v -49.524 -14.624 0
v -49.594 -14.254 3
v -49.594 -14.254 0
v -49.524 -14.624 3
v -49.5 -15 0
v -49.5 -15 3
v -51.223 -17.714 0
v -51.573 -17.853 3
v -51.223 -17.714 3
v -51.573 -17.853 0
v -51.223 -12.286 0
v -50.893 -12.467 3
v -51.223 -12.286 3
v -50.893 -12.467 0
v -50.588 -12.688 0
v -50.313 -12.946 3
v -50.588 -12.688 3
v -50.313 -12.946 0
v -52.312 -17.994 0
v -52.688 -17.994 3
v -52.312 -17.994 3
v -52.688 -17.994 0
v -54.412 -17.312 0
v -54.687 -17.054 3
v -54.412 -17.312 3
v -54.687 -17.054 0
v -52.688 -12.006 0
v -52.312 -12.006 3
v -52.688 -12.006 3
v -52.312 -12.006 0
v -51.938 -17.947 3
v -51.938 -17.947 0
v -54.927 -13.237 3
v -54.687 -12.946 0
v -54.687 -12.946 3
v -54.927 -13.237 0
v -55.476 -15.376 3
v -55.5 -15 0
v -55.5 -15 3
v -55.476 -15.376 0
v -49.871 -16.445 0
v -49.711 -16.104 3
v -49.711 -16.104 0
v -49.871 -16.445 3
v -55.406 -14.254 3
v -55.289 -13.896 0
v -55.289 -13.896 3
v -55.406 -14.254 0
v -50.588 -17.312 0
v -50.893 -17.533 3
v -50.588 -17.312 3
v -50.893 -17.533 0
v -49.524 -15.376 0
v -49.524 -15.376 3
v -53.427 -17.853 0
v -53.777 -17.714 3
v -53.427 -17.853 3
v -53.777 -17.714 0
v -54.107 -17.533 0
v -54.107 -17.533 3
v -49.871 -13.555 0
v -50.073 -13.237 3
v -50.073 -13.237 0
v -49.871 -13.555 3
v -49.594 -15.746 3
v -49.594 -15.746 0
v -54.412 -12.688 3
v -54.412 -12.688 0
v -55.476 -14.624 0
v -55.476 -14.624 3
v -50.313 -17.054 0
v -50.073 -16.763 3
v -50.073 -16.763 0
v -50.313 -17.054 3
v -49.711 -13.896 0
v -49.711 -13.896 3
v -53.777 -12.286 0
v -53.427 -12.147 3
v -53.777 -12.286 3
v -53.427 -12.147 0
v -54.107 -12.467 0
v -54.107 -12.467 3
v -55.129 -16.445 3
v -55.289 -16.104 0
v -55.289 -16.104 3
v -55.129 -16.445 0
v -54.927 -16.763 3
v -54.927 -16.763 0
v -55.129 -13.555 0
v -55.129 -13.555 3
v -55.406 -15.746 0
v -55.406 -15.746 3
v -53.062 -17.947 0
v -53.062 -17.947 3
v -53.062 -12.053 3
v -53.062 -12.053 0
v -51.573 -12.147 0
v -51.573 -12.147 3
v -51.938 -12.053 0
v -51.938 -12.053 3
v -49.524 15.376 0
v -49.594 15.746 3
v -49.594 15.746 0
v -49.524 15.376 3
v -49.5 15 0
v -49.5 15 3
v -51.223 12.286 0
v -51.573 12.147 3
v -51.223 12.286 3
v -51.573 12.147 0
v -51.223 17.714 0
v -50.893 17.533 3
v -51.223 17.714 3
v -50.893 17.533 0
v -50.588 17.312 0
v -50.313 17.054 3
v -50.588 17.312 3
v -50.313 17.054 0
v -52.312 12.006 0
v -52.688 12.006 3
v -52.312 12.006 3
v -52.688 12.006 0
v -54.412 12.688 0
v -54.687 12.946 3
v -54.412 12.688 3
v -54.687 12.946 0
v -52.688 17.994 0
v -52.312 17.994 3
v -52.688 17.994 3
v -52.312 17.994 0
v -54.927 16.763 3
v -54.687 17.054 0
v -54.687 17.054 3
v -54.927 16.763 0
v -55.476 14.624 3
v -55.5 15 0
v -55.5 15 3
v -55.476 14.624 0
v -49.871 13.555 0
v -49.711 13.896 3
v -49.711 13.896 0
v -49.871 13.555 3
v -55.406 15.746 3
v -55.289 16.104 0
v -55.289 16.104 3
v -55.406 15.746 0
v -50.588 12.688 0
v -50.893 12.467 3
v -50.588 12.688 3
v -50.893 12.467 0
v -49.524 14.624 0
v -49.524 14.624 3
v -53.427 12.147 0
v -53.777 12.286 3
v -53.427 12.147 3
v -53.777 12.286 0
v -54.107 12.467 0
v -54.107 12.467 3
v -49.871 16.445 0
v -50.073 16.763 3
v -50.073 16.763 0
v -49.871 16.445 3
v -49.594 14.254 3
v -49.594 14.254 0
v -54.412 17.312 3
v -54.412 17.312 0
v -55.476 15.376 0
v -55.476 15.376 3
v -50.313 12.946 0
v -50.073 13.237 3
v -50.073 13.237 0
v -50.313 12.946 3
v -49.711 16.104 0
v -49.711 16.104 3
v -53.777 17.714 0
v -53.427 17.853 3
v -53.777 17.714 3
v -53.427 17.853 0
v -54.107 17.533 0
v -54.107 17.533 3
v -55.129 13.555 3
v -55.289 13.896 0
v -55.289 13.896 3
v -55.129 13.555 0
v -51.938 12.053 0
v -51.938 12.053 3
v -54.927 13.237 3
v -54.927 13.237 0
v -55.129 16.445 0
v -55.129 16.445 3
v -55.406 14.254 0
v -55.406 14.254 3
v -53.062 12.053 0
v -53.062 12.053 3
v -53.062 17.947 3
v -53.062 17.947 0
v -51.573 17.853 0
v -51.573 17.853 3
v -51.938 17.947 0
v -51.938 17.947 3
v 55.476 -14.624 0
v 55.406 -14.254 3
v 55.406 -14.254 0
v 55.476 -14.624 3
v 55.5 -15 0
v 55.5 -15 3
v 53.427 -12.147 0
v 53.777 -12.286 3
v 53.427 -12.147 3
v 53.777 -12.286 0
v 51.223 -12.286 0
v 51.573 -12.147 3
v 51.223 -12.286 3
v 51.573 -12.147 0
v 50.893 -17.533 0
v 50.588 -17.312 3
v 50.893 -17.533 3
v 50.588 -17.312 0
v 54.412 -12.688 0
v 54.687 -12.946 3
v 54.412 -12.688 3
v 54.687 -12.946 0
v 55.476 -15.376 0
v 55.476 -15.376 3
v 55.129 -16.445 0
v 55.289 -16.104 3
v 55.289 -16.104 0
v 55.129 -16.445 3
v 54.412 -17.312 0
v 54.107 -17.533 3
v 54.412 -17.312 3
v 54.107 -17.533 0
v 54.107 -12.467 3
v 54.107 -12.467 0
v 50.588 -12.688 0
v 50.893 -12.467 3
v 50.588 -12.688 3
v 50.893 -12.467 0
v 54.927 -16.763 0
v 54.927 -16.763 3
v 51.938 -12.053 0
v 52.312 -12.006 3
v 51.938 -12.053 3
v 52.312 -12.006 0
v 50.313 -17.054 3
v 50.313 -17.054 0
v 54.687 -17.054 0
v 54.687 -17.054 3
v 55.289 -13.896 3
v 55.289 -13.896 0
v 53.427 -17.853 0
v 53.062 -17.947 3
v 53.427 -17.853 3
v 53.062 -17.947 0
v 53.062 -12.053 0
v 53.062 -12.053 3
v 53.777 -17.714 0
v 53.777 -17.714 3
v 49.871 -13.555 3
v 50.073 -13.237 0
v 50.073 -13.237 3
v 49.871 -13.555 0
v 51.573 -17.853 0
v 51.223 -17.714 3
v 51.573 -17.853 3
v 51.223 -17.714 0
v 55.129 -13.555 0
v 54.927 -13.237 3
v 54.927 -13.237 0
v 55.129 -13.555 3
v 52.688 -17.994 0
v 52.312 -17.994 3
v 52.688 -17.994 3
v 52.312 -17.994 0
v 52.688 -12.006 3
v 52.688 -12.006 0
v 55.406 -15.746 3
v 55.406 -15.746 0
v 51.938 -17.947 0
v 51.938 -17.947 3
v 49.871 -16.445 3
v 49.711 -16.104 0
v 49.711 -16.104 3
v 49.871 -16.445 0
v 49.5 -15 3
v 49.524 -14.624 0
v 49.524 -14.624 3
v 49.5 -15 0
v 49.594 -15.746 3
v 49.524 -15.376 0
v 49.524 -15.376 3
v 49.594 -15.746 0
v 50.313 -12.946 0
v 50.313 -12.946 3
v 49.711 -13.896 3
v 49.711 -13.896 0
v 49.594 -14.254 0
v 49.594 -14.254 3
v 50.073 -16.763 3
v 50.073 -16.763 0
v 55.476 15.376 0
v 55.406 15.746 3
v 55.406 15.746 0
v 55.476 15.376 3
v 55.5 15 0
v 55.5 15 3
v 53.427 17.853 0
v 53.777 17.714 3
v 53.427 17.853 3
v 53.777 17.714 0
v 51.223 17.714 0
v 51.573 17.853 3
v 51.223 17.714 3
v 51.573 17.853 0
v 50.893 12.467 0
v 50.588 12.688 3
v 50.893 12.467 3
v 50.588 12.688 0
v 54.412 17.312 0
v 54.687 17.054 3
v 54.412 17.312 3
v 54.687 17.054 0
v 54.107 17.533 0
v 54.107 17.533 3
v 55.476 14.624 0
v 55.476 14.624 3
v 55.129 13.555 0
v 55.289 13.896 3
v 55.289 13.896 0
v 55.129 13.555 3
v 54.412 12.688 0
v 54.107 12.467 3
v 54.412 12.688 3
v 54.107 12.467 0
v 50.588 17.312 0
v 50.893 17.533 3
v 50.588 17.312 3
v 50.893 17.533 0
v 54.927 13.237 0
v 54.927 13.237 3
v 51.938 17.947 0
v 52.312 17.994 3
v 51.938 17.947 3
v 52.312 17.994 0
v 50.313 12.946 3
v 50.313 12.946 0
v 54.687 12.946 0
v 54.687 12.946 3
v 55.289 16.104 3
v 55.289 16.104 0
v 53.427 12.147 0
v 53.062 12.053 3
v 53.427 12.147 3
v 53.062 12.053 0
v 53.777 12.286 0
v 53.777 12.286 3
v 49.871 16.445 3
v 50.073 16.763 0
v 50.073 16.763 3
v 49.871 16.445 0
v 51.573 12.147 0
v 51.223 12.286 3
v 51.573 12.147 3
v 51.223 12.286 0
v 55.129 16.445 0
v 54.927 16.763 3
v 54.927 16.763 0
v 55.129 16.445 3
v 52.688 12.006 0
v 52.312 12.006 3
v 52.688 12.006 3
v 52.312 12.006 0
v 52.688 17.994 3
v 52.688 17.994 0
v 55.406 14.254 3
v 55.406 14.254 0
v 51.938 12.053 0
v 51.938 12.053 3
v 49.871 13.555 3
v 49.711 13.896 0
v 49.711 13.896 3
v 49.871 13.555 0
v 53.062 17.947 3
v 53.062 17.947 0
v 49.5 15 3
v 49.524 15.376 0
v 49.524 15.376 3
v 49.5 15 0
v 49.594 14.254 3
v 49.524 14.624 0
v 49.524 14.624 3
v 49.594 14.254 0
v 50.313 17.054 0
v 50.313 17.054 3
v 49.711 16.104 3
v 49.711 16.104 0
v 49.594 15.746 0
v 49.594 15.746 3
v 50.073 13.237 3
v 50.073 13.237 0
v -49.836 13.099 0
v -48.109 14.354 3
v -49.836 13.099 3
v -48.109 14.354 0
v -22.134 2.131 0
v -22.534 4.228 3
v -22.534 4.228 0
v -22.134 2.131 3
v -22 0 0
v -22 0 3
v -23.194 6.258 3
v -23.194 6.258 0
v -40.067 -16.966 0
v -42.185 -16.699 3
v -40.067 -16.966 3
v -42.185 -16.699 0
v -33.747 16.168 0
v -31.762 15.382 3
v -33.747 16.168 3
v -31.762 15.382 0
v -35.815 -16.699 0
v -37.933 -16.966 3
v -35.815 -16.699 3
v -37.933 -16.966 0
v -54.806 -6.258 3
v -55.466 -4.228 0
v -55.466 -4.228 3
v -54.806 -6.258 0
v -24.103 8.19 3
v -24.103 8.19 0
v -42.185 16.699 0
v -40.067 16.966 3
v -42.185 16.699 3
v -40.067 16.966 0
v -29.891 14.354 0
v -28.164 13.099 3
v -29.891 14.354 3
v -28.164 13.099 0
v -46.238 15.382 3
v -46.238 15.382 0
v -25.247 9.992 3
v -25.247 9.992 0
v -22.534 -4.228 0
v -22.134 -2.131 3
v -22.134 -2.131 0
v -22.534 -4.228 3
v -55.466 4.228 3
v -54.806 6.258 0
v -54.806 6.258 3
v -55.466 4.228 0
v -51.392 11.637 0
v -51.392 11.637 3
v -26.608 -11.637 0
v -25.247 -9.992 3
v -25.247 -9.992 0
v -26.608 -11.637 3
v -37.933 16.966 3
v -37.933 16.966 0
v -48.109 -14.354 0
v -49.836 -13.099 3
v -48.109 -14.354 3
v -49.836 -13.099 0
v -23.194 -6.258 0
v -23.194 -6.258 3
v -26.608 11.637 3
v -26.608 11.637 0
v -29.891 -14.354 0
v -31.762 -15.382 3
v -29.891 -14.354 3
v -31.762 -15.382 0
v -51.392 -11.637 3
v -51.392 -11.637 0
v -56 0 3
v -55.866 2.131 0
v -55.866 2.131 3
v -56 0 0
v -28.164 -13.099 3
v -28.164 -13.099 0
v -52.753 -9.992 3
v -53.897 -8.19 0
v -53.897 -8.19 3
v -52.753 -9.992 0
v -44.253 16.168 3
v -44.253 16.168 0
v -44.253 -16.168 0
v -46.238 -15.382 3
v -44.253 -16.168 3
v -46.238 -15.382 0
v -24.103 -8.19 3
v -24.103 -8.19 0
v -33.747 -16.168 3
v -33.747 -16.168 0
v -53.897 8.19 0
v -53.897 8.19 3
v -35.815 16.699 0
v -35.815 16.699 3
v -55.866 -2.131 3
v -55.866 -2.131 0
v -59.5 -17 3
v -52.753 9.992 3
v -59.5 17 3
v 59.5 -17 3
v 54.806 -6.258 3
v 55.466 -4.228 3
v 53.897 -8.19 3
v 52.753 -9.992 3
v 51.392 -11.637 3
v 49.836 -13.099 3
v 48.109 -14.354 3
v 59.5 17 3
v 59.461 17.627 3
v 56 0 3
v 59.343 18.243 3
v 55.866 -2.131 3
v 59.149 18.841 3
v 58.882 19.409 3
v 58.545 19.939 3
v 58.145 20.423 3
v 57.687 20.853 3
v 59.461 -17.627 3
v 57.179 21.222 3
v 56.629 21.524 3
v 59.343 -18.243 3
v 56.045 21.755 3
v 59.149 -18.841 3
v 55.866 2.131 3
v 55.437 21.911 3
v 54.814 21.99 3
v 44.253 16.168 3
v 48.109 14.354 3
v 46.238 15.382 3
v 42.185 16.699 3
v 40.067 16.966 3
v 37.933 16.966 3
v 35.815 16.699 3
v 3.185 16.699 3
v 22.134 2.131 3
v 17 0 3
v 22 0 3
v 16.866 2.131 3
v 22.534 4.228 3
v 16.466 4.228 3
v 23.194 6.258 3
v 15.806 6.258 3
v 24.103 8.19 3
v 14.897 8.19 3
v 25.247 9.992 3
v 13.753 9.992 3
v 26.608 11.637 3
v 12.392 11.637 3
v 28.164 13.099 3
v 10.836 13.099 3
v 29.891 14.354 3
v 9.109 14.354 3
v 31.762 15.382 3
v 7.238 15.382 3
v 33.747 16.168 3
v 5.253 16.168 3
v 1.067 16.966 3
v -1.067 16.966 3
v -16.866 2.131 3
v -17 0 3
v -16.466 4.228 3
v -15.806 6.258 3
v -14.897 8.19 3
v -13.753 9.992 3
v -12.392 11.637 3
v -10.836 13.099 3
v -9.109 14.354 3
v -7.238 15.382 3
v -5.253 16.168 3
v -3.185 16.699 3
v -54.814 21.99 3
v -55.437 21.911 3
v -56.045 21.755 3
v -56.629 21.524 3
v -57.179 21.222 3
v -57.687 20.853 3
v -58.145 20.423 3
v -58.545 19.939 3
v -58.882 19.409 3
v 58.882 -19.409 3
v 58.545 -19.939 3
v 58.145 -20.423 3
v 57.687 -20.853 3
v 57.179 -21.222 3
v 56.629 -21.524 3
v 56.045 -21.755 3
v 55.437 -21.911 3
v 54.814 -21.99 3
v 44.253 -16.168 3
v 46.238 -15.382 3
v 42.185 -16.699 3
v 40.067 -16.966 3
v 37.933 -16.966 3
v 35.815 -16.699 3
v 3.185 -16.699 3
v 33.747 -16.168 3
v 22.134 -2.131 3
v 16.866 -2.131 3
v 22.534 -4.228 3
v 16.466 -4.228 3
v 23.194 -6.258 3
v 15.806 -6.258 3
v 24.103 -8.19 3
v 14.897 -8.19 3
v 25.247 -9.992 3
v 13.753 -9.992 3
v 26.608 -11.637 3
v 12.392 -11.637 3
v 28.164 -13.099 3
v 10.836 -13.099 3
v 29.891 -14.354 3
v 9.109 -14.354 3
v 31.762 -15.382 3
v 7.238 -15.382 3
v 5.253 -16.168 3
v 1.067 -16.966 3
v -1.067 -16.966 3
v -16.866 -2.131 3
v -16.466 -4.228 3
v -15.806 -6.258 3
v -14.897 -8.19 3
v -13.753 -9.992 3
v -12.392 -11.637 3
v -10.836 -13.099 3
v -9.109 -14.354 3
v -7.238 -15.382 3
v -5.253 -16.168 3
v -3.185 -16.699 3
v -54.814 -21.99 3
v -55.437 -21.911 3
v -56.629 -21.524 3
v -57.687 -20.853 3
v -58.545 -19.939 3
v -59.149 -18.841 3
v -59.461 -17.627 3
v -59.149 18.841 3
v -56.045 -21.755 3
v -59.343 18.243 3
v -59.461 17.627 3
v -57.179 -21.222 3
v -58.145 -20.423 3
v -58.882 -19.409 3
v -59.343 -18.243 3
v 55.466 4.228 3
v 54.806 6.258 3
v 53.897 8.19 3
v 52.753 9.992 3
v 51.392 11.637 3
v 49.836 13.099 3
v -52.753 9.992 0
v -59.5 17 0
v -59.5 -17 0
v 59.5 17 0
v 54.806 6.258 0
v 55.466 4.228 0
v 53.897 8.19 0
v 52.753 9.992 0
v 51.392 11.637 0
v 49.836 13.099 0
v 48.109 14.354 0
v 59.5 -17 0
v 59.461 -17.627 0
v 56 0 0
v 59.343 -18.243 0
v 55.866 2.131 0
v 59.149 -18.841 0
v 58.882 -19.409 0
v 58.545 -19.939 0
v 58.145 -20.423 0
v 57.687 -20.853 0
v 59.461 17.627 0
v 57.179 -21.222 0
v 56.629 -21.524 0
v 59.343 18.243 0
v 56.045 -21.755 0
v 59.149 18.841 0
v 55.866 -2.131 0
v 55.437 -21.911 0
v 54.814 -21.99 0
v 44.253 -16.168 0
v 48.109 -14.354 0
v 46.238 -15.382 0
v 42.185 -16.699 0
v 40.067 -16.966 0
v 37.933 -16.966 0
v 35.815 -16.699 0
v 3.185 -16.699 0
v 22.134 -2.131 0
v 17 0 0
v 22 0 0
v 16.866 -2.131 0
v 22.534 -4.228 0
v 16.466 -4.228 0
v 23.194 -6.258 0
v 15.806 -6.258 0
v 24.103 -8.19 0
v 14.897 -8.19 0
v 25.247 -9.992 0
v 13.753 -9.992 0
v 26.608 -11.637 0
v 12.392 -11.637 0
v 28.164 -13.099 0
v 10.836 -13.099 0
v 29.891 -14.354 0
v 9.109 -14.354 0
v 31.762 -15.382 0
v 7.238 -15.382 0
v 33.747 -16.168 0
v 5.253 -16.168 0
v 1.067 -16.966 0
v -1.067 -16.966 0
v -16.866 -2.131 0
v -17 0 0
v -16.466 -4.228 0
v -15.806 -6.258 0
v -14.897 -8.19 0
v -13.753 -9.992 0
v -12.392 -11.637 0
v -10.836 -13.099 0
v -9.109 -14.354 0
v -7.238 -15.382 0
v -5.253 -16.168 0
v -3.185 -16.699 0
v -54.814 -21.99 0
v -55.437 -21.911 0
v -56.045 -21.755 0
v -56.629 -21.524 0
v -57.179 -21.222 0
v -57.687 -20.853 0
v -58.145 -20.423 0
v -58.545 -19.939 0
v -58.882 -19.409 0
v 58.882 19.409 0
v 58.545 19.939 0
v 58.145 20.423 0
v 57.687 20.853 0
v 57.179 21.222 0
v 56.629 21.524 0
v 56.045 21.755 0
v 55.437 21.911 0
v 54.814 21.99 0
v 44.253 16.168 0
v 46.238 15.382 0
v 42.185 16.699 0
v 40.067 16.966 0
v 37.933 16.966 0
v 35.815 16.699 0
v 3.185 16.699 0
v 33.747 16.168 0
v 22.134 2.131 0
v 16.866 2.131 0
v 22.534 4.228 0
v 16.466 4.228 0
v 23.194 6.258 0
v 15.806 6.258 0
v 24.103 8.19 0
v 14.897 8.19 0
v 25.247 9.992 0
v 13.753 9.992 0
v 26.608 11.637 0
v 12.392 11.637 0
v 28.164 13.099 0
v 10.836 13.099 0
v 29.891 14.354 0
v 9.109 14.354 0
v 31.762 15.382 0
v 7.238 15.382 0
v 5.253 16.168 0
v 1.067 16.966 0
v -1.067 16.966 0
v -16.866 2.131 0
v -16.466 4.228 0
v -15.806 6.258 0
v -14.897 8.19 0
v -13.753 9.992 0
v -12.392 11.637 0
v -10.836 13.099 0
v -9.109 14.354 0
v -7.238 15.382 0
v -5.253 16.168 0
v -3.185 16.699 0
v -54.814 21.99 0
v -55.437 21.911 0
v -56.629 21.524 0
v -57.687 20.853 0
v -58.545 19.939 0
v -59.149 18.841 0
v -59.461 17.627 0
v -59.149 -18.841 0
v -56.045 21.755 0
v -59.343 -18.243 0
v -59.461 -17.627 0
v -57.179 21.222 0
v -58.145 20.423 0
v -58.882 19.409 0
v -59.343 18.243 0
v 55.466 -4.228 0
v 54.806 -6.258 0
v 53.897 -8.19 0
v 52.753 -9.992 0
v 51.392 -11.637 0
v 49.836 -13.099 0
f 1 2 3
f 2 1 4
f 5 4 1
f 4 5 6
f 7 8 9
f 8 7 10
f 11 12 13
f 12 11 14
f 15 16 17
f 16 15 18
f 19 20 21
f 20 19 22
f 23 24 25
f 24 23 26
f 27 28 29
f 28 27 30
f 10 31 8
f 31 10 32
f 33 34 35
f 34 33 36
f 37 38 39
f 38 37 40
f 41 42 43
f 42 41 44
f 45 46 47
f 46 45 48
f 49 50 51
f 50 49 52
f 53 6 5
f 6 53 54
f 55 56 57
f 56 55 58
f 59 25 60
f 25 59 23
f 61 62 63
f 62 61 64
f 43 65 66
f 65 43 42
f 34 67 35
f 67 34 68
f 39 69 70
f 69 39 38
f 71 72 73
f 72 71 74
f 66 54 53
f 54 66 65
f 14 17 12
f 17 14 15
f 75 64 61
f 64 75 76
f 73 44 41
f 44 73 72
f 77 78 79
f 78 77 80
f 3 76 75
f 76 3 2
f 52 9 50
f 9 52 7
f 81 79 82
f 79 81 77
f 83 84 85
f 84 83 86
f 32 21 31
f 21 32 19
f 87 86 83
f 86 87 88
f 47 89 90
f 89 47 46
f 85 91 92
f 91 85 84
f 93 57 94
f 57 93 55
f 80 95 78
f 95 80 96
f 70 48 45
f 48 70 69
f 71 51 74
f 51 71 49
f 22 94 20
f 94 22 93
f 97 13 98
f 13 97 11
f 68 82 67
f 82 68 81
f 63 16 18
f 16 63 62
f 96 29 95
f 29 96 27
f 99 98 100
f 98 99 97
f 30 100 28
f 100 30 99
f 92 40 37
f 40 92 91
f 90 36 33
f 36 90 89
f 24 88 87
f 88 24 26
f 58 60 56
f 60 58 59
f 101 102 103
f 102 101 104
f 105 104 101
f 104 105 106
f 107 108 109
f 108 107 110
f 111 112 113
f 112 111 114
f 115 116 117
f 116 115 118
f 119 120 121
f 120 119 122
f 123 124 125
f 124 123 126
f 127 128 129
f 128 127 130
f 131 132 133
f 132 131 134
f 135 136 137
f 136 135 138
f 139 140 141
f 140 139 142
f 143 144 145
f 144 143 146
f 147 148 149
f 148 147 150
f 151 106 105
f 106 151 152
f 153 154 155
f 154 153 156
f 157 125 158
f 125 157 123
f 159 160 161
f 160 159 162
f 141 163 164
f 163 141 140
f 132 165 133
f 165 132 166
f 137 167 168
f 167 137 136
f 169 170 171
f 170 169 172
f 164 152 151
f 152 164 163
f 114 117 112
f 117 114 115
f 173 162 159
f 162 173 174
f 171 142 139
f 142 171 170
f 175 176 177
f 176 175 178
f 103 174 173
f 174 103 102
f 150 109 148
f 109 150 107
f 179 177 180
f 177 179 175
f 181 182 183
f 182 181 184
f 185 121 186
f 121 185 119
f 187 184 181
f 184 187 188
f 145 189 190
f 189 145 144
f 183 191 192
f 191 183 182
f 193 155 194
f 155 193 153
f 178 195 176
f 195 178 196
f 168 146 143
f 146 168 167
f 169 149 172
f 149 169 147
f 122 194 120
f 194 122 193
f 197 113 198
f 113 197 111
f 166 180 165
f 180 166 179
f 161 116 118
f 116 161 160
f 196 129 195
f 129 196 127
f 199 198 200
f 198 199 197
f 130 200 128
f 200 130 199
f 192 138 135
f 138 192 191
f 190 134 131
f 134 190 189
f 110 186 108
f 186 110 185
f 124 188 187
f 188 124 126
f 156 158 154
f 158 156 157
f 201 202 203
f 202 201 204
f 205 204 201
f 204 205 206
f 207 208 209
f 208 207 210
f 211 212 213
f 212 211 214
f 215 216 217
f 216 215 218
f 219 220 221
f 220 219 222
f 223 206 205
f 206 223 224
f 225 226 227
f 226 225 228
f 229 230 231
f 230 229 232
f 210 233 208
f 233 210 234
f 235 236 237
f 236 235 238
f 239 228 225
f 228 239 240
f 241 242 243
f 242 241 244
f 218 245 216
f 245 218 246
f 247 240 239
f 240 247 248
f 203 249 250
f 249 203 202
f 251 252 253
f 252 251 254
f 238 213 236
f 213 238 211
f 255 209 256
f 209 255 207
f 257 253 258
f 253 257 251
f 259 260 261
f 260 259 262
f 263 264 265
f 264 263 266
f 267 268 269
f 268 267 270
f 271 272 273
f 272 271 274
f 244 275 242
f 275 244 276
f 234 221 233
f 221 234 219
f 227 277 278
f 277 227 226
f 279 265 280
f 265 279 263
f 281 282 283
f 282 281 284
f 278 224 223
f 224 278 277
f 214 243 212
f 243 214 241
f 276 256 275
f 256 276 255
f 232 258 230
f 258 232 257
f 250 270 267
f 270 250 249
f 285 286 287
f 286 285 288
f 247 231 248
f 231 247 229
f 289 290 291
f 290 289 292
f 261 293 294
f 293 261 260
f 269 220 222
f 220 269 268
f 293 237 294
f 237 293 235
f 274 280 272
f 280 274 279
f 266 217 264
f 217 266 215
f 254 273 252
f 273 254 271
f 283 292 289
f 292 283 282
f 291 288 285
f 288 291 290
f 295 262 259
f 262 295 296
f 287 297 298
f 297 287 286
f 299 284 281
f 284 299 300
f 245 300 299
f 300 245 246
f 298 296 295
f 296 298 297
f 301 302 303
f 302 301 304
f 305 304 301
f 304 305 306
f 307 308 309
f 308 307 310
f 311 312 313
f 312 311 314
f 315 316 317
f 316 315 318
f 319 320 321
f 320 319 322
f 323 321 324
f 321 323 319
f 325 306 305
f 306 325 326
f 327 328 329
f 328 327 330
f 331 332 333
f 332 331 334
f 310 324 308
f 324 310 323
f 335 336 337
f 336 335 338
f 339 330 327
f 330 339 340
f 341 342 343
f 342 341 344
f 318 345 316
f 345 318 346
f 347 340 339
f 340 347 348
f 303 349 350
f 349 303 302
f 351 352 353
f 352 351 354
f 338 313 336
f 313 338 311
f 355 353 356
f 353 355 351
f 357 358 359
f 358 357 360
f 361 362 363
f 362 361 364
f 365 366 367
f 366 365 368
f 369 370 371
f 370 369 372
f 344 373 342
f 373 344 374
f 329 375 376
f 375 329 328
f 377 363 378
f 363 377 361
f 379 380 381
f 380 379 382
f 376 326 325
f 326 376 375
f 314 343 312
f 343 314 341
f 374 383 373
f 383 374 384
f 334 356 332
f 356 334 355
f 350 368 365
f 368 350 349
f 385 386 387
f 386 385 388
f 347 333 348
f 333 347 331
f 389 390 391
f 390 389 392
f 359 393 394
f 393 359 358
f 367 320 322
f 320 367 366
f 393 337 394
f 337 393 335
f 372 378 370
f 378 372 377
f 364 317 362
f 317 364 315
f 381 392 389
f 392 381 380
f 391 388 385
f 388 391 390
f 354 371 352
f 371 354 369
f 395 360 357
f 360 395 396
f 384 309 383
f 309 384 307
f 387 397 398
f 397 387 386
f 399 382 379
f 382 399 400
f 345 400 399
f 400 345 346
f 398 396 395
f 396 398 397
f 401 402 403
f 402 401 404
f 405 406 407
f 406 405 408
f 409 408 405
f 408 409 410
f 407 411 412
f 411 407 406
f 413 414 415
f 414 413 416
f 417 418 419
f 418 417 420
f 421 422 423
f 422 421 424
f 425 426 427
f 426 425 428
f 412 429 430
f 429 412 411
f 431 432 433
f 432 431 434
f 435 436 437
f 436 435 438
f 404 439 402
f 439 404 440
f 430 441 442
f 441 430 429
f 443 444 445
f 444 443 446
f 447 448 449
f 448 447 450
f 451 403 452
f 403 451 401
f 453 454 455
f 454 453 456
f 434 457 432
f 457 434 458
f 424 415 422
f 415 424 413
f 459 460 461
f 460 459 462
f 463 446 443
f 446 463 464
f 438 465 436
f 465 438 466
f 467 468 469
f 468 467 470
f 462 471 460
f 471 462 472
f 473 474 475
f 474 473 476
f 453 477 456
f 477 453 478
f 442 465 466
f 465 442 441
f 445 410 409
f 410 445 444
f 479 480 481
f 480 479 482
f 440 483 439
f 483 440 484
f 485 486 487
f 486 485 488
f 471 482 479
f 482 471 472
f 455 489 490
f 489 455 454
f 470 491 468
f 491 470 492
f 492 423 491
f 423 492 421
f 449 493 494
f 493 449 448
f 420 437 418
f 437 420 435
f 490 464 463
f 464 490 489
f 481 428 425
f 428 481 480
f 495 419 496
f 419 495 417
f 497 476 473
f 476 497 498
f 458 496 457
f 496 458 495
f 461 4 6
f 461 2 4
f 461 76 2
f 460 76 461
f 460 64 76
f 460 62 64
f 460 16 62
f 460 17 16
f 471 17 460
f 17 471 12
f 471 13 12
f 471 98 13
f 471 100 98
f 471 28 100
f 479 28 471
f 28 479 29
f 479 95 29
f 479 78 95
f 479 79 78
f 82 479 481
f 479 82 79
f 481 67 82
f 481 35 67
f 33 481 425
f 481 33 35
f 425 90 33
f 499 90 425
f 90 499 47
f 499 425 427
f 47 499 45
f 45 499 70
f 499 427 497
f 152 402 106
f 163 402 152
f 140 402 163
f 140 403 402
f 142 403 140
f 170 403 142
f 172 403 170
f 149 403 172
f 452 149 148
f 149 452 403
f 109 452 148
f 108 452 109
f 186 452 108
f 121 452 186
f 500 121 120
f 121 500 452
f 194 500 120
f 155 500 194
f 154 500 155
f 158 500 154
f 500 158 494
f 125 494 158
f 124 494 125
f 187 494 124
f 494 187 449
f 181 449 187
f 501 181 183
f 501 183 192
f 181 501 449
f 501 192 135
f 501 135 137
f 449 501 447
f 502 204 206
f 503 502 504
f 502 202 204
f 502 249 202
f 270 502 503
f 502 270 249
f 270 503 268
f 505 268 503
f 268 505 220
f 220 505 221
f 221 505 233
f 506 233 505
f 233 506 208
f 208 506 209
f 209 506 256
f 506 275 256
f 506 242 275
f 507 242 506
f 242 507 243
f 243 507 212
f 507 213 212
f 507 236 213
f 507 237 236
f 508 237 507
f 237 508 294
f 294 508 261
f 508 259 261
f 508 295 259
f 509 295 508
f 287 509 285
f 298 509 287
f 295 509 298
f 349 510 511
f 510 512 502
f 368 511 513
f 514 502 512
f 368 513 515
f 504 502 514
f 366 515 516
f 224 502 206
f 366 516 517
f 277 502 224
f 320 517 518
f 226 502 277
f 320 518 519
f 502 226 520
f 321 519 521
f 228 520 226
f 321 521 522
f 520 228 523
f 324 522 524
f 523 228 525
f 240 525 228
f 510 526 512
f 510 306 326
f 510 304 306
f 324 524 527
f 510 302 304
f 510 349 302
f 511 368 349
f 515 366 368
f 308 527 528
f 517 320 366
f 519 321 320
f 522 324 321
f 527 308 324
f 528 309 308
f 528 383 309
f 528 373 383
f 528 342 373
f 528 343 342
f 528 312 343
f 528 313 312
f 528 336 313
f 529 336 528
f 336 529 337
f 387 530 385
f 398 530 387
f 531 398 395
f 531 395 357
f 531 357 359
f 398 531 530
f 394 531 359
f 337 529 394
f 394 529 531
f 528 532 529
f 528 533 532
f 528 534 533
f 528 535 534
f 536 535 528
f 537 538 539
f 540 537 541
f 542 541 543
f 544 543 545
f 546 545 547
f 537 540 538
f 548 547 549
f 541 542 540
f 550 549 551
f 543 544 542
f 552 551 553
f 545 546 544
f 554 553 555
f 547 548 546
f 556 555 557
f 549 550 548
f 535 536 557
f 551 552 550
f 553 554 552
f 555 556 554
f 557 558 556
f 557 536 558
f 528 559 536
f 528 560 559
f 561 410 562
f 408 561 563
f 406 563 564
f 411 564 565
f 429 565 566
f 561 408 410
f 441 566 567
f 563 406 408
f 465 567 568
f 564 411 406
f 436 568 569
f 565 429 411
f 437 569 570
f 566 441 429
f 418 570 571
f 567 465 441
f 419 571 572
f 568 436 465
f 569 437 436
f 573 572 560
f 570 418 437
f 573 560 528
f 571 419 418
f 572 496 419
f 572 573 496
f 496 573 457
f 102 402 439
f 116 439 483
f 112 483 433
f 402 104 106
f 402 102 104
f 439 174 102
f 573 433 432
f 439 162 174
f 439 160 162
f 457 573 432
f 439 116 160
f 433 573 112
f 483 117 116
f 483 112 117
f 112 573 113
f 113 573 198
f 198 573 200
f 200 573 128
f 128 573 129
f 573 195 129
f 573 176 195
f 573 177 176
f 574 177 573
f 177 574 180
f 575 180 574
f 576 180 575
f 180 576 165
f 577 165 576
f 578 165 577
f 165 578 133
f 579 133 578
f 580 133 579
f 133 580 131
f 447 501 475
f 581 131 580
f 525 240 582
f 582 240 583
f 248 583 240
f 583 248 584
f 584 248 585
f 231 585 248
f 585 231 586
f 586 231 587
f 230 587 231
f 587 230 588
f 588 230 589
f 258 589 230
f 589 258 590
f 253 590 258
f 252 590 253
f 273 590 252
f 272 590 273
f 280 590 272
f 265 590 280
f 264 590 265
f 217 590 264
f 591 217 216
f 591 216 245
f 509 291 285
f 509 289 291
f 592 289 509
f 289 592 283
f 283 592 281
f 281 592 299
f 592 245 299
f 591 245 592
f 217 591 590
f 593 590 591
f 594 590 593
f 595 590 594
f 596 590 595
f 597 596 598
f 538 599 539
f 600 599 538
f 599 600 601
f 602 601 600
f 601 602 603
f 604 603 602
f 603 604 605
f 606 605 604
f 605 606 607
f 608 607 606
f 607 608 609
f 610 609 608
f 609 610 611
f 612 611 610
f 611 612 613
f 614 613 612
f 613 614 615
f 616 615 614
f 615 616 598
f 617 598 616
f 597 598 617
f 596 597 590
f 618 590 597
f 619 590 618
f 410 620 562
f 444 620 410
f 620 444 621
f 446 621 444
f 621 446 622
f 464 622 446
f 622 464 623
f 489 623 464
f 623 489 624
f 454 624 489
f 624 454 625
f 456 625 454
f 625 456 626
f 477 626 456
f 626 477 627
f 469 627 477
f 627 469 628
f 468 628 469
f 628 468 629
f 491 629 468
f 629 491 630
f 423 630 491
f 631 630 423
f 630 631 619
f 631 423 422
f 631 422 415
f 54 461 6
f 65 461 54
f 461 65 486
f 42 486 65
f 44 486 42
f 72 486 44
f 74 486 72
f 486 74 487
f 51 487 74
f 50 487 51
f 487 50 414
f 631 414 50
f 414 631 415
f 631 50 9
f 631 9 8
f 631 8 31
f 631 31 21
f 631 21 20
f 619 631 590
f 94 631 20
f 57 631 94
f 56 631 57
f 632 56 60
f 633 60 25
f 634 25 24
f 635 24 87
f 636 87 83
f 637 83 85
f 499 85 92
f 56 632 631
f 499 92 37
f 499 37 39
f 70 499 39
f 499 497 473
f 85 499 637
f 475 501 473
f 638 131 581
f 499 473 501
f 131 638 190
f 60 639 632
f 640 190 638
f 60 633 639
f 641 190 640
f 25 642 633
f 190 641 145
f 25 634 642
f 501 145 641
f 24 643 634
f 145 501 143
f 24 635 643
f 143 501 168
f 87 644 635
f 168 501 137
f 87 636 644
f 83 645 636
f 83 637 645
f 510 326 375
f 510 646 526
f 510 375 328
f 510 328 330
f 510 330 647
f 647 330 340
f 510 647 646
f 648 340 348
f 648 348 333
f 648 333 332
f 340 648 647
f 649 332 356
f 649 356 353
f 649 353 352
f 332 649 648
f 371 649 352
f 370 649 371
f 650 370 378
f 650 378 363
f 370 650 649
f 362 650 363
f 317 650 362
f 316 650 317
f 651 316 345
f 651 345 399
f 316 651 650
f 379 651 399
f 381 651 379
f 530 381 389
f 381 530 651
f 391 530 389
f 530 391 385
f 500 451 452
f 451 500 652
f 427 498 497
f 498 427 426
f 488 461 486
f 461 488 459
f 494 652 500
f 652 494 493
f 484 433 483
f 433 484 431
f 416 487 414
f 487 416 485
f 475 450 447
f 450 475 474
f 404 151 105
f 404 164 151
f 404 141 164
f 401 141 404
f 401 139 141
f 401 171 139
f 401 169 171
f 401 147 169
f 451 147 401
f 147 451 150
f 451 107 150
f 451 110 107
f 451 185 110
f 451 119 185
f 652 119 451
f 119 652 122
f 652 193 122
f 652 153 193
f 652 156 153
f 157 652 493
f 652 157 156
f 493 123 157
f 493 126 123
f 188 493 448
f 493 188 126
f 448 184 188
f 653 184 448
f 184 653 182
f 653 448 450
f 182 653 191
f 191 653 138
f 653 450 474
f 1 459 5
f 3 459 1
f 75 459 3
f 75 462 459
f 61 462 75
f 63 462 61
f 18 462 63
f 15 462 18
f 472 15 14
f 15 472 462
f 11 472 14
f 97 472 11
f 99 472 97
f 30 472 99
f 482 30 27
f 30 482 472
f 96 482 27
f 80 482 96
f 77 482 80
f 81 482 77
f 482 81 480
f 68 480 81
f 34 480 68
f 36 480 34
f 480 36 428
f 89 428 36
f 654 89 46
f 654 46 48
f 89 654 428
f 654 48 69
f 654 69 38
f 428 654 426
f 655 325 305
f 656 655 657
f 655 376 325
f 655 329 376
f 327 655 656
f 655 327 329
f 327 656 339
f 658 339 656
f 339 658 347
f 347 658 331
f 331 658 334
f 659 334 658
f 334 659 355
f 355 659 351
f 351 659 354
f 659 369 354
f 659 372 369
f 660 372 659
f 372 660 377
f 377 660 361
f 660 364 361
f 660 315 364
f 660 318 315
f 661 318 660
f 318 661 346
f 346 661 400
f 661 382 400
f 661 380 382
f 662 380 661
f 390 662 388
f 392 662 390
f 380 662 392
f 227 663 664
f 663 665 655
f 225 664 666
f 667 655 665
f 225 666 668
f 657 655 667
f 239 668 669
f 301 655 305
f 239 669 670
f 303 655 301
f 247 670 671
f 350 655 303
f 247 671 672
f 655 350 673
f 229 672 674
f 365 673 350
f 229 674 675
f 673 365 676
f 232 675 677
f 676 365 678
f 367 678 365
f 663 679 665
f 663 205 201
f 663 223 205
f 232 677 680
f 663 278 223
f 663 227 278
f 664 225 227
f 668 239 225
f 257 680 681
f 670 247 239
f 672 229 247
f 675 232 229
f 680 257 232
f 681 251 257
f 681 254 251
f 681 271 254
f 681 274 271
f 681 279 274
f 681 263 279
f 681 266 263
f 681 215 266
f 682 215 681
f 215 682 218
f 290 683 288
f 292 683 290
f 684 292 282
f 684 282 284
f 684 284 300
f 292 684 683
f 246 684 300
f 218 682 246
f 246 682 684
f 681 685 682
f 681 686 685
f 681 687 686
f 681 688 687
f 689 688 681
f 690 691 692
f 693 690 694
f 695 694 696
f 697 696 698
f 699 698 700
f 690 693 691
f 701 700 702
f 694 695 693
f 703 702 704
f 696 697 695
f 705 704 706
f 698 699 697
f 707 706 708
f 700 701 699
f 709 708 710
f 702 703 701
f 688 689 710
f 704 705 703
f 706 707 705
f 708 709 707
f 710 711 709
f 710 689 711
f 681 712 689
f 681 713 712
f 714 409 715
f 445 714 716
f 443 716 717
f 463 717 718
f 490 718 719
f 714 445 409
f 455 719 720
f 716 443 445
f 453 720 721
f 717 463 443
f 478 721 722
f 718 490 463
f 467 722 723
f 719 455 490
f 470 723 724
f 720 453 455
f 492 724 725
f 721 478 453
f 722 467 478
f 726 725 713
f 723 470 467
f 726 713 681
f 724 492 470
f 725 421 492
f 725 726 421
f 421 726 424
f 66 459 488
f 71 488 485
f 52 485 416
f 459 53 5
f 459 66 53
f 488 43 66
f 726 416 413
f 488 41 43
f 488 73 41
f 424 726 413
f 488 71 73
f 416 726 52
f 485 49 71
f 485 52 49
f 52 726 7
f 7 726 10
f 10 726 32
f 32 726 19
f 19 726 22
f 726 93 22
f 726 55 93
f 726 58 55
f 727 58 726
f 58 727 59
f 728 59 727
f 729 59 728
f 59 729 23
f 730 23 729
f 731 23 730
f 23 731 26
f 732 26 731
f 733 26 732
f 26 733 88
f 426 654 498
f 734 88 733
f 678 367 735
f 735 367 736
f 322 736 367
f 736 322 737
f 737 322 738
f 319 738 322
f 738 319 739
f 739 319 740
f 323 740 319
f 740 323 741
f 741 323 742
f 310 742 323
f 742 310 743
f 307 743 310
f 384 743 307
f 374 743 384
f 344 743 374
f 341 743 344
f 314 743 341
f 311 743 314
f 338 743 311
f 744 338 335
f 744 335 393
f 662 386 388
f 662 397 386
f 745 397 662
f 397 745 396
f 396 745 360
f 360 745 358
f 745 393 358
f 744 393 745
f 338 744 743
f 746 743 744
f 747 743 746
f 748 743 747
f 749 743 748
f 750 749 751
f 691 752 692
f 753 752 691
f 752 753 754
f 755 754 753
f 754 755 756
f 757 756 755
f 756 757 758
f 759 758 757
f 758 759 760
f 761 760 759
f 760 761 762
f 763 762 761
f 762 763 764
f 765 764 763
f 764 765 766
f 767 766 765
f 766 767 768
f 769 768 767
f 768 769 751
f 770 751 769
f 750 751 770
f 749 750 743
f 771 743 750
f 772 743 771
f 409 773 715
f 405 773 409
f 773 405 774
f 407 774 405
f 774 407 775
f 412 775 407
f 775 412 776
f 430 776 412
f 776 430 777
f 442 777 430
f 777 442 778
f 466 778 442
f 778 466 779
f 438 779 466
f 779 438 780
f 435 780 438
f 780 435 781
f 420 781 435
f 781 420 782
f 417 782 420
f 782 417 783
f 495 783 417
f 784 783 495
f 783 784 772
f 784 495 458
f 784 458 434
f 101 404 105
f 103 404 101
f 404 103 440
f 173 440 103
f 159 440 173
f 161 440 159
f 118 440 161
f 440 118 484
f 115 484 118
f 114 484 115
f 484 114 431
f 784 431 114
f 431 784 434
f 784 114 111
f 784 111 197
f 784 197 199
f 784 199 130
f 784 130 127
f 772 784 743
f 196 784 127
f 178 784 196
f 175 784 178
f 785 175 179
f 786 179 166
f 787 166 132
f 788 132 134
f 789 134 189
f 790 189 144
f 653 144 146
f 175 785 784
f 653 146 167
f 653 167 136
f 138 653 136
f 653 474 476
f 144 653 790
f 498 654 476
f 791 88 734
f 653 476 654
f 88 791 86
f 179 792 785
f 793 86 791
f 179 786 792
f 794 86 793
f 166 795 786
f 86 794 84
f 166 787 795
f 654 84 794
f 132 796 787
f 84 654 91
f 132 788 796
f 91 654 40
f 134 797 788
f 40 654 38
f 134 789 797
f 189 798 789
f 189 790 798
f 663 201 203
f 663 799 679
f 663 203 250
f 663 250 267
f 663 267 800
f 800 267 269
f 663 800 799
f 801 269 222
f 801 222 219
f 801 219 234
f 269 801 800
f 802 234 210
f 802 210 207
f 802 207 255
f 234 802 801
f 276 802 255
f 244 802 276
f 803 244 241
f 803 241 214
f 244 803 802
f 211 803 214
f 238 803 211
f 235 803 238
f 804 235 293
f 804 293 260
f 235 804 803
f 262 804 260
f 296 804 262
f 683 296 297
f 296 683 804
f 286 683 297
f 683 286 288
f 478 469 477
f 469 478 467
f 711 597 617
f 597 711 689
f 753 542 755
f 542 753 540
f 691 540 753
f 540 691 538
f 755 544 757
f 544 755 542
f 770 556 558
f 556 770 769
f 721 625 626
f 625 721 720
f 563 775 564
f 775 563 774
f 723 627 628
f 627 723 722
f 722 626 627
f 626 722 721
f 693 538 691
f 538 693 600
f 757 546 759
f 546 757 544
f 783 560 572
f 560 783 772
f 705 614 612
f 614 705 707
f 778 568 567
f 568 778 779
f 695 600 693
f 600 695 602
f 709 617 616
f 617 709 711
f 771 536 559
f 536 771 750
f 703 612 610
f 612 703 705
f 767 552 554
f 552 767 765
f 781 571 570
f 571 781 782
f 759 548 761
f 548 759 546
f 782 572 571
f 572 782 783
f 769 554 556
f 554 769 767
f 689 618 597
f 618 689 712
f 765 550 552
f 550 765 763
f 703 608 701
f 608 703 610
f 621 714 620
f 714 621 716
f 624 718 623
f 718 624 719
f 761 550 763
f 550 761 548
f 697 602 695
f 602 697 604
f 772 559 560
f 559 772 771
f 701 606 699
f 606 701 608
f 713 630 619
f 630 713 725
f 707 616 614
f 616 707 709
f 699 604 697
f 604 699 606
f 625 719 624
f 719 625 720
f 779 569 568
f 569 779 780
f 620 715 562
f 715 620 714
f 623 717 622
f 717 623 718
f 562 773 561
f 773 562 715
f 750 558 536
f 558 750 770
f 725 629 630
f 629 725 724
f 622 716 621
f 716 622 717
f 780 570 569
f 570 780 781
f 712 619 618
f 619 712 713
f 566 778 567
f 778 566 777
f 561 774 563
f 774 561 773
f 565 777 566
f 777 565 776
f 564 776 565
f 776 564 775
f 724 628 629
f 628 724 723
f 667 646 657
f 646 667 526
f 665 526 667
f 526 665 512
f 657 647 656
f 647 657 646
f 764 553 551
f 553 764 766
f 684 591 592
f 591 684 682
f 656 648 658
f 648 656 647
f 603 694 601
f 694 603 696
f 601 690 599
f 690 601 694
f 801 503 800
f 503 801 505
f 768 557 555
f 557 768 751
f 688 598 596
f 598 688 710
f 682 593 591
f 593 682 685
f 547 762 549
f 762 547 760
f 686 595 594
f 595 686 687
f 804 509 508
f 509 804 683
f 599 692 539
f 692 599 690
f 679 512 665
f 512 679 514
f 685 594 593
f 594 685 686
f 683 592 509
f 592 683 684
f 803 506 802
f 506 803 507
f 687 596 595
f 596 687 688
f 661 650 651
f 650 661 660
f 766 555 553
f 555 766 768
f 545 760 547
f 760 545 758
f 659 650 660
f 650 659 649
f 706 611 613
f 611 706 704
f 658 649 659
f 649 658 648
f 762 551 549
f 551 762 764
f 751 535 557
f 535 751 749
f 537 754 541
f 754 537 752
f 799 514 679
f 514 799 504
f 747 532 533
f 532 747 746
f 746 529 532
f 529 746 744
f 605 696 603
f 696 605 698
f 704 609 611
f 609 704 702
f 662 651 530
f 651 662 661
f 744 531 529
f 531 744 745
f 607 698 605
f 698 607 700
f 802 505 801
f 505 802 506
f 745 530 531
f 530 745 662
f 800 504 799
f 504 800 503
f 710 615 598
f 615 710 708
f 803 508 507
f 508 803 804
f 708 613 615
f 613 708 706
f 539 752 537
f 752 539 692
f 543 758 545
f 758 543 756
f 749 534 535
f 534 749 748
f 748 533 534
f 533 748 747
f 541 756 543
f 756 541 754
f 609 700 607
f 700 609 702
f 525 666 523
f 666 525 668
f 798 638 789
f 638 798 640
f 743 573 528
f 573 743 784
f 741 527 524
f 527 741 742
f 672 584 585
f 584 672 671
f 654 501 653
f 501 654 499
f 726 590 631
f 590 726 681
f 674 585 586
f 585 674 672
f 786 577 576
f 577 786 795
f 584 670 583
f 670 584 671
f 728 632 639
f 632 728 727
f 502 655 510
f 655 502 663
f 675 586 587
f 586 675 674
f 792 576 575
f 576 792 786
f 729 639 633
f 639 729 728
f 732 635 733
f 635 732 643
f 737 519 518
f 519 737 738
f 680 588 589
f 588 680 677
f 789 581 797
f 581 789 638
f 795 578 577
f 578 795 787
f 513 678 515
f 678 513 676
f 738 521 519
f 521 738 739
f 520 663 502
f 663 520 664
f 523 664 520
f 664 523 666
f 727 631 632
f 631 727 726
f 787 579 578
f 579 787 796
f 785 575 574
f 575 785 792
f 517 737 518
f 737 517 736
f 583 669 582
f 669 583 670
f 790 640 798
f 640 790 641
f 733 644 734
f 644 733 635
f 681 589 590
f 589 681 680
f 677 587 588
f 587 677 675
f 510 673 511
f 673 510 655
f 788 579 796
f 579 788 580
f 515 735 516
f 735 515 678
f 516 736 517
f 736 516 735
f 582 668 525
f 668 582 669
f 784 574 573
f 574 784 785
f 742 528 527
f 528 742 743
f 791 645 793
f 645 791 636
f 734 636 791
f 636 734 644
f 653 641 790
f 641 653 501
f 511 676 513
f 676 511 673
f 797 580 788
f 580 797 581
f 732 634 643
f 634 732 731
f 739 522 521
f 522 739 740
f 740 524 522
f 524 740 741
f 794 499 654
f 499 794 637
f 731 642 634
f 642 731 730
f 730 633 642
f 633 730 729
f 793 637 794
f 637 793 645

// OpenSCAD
$fn = 50;


difference() {
	union() {
		hull() {
			translate(v = [-54.5000000000, 17.0000000000, 0]) {
				cylinder(h = 3, r = 5);
			}
			translate(v = [54.5000000000, 17.0000000000, 0]) {
				cylinder(h = 3, r = 5);
			}
			translate(v = [-54.5000000000, -17.0000000000, 0]) {
				cylinder(h = 3, r = 5);
			}
			translate(v = [54.5000000000, -17.0000000000, 0]) {
				cylinder(h = 3, r = 5);
			}
		}
	}
	union() {
		#translate(v = [-52.5000000000, -15.0000000000, -100.0000000000]) {
			cylinder(h = 200, r = 3.0000000000);
		}
		#translate(v = [-52.5000000000, 15.0000000000, -100.0000000000]) {
			cylinder(h = 200, r = 3.0000000000);
		}
		#translate(v = [52.5000000000, -15.0000000000, -100.0000000000]) {
			cylinder(h = 200, r = 3.0000000000);
		}
		#translate(v = [52.5000000000, 15.0000000000, -100.0000000000]) {
			cylinder(h = 200, r = 3.0000000000);
		}
		#translate(v = [-39.0000000000, 0, 0]) {
			cylinder(h = 3, r = 17.0000000000);
		}
		#cylinder(h = 3, r = 17.0000000000);
		#translate(v = [39.0000000000, 0, 0]) {
			cylinder(h = 3, r = 17.0000000000);
		}
	}
}
